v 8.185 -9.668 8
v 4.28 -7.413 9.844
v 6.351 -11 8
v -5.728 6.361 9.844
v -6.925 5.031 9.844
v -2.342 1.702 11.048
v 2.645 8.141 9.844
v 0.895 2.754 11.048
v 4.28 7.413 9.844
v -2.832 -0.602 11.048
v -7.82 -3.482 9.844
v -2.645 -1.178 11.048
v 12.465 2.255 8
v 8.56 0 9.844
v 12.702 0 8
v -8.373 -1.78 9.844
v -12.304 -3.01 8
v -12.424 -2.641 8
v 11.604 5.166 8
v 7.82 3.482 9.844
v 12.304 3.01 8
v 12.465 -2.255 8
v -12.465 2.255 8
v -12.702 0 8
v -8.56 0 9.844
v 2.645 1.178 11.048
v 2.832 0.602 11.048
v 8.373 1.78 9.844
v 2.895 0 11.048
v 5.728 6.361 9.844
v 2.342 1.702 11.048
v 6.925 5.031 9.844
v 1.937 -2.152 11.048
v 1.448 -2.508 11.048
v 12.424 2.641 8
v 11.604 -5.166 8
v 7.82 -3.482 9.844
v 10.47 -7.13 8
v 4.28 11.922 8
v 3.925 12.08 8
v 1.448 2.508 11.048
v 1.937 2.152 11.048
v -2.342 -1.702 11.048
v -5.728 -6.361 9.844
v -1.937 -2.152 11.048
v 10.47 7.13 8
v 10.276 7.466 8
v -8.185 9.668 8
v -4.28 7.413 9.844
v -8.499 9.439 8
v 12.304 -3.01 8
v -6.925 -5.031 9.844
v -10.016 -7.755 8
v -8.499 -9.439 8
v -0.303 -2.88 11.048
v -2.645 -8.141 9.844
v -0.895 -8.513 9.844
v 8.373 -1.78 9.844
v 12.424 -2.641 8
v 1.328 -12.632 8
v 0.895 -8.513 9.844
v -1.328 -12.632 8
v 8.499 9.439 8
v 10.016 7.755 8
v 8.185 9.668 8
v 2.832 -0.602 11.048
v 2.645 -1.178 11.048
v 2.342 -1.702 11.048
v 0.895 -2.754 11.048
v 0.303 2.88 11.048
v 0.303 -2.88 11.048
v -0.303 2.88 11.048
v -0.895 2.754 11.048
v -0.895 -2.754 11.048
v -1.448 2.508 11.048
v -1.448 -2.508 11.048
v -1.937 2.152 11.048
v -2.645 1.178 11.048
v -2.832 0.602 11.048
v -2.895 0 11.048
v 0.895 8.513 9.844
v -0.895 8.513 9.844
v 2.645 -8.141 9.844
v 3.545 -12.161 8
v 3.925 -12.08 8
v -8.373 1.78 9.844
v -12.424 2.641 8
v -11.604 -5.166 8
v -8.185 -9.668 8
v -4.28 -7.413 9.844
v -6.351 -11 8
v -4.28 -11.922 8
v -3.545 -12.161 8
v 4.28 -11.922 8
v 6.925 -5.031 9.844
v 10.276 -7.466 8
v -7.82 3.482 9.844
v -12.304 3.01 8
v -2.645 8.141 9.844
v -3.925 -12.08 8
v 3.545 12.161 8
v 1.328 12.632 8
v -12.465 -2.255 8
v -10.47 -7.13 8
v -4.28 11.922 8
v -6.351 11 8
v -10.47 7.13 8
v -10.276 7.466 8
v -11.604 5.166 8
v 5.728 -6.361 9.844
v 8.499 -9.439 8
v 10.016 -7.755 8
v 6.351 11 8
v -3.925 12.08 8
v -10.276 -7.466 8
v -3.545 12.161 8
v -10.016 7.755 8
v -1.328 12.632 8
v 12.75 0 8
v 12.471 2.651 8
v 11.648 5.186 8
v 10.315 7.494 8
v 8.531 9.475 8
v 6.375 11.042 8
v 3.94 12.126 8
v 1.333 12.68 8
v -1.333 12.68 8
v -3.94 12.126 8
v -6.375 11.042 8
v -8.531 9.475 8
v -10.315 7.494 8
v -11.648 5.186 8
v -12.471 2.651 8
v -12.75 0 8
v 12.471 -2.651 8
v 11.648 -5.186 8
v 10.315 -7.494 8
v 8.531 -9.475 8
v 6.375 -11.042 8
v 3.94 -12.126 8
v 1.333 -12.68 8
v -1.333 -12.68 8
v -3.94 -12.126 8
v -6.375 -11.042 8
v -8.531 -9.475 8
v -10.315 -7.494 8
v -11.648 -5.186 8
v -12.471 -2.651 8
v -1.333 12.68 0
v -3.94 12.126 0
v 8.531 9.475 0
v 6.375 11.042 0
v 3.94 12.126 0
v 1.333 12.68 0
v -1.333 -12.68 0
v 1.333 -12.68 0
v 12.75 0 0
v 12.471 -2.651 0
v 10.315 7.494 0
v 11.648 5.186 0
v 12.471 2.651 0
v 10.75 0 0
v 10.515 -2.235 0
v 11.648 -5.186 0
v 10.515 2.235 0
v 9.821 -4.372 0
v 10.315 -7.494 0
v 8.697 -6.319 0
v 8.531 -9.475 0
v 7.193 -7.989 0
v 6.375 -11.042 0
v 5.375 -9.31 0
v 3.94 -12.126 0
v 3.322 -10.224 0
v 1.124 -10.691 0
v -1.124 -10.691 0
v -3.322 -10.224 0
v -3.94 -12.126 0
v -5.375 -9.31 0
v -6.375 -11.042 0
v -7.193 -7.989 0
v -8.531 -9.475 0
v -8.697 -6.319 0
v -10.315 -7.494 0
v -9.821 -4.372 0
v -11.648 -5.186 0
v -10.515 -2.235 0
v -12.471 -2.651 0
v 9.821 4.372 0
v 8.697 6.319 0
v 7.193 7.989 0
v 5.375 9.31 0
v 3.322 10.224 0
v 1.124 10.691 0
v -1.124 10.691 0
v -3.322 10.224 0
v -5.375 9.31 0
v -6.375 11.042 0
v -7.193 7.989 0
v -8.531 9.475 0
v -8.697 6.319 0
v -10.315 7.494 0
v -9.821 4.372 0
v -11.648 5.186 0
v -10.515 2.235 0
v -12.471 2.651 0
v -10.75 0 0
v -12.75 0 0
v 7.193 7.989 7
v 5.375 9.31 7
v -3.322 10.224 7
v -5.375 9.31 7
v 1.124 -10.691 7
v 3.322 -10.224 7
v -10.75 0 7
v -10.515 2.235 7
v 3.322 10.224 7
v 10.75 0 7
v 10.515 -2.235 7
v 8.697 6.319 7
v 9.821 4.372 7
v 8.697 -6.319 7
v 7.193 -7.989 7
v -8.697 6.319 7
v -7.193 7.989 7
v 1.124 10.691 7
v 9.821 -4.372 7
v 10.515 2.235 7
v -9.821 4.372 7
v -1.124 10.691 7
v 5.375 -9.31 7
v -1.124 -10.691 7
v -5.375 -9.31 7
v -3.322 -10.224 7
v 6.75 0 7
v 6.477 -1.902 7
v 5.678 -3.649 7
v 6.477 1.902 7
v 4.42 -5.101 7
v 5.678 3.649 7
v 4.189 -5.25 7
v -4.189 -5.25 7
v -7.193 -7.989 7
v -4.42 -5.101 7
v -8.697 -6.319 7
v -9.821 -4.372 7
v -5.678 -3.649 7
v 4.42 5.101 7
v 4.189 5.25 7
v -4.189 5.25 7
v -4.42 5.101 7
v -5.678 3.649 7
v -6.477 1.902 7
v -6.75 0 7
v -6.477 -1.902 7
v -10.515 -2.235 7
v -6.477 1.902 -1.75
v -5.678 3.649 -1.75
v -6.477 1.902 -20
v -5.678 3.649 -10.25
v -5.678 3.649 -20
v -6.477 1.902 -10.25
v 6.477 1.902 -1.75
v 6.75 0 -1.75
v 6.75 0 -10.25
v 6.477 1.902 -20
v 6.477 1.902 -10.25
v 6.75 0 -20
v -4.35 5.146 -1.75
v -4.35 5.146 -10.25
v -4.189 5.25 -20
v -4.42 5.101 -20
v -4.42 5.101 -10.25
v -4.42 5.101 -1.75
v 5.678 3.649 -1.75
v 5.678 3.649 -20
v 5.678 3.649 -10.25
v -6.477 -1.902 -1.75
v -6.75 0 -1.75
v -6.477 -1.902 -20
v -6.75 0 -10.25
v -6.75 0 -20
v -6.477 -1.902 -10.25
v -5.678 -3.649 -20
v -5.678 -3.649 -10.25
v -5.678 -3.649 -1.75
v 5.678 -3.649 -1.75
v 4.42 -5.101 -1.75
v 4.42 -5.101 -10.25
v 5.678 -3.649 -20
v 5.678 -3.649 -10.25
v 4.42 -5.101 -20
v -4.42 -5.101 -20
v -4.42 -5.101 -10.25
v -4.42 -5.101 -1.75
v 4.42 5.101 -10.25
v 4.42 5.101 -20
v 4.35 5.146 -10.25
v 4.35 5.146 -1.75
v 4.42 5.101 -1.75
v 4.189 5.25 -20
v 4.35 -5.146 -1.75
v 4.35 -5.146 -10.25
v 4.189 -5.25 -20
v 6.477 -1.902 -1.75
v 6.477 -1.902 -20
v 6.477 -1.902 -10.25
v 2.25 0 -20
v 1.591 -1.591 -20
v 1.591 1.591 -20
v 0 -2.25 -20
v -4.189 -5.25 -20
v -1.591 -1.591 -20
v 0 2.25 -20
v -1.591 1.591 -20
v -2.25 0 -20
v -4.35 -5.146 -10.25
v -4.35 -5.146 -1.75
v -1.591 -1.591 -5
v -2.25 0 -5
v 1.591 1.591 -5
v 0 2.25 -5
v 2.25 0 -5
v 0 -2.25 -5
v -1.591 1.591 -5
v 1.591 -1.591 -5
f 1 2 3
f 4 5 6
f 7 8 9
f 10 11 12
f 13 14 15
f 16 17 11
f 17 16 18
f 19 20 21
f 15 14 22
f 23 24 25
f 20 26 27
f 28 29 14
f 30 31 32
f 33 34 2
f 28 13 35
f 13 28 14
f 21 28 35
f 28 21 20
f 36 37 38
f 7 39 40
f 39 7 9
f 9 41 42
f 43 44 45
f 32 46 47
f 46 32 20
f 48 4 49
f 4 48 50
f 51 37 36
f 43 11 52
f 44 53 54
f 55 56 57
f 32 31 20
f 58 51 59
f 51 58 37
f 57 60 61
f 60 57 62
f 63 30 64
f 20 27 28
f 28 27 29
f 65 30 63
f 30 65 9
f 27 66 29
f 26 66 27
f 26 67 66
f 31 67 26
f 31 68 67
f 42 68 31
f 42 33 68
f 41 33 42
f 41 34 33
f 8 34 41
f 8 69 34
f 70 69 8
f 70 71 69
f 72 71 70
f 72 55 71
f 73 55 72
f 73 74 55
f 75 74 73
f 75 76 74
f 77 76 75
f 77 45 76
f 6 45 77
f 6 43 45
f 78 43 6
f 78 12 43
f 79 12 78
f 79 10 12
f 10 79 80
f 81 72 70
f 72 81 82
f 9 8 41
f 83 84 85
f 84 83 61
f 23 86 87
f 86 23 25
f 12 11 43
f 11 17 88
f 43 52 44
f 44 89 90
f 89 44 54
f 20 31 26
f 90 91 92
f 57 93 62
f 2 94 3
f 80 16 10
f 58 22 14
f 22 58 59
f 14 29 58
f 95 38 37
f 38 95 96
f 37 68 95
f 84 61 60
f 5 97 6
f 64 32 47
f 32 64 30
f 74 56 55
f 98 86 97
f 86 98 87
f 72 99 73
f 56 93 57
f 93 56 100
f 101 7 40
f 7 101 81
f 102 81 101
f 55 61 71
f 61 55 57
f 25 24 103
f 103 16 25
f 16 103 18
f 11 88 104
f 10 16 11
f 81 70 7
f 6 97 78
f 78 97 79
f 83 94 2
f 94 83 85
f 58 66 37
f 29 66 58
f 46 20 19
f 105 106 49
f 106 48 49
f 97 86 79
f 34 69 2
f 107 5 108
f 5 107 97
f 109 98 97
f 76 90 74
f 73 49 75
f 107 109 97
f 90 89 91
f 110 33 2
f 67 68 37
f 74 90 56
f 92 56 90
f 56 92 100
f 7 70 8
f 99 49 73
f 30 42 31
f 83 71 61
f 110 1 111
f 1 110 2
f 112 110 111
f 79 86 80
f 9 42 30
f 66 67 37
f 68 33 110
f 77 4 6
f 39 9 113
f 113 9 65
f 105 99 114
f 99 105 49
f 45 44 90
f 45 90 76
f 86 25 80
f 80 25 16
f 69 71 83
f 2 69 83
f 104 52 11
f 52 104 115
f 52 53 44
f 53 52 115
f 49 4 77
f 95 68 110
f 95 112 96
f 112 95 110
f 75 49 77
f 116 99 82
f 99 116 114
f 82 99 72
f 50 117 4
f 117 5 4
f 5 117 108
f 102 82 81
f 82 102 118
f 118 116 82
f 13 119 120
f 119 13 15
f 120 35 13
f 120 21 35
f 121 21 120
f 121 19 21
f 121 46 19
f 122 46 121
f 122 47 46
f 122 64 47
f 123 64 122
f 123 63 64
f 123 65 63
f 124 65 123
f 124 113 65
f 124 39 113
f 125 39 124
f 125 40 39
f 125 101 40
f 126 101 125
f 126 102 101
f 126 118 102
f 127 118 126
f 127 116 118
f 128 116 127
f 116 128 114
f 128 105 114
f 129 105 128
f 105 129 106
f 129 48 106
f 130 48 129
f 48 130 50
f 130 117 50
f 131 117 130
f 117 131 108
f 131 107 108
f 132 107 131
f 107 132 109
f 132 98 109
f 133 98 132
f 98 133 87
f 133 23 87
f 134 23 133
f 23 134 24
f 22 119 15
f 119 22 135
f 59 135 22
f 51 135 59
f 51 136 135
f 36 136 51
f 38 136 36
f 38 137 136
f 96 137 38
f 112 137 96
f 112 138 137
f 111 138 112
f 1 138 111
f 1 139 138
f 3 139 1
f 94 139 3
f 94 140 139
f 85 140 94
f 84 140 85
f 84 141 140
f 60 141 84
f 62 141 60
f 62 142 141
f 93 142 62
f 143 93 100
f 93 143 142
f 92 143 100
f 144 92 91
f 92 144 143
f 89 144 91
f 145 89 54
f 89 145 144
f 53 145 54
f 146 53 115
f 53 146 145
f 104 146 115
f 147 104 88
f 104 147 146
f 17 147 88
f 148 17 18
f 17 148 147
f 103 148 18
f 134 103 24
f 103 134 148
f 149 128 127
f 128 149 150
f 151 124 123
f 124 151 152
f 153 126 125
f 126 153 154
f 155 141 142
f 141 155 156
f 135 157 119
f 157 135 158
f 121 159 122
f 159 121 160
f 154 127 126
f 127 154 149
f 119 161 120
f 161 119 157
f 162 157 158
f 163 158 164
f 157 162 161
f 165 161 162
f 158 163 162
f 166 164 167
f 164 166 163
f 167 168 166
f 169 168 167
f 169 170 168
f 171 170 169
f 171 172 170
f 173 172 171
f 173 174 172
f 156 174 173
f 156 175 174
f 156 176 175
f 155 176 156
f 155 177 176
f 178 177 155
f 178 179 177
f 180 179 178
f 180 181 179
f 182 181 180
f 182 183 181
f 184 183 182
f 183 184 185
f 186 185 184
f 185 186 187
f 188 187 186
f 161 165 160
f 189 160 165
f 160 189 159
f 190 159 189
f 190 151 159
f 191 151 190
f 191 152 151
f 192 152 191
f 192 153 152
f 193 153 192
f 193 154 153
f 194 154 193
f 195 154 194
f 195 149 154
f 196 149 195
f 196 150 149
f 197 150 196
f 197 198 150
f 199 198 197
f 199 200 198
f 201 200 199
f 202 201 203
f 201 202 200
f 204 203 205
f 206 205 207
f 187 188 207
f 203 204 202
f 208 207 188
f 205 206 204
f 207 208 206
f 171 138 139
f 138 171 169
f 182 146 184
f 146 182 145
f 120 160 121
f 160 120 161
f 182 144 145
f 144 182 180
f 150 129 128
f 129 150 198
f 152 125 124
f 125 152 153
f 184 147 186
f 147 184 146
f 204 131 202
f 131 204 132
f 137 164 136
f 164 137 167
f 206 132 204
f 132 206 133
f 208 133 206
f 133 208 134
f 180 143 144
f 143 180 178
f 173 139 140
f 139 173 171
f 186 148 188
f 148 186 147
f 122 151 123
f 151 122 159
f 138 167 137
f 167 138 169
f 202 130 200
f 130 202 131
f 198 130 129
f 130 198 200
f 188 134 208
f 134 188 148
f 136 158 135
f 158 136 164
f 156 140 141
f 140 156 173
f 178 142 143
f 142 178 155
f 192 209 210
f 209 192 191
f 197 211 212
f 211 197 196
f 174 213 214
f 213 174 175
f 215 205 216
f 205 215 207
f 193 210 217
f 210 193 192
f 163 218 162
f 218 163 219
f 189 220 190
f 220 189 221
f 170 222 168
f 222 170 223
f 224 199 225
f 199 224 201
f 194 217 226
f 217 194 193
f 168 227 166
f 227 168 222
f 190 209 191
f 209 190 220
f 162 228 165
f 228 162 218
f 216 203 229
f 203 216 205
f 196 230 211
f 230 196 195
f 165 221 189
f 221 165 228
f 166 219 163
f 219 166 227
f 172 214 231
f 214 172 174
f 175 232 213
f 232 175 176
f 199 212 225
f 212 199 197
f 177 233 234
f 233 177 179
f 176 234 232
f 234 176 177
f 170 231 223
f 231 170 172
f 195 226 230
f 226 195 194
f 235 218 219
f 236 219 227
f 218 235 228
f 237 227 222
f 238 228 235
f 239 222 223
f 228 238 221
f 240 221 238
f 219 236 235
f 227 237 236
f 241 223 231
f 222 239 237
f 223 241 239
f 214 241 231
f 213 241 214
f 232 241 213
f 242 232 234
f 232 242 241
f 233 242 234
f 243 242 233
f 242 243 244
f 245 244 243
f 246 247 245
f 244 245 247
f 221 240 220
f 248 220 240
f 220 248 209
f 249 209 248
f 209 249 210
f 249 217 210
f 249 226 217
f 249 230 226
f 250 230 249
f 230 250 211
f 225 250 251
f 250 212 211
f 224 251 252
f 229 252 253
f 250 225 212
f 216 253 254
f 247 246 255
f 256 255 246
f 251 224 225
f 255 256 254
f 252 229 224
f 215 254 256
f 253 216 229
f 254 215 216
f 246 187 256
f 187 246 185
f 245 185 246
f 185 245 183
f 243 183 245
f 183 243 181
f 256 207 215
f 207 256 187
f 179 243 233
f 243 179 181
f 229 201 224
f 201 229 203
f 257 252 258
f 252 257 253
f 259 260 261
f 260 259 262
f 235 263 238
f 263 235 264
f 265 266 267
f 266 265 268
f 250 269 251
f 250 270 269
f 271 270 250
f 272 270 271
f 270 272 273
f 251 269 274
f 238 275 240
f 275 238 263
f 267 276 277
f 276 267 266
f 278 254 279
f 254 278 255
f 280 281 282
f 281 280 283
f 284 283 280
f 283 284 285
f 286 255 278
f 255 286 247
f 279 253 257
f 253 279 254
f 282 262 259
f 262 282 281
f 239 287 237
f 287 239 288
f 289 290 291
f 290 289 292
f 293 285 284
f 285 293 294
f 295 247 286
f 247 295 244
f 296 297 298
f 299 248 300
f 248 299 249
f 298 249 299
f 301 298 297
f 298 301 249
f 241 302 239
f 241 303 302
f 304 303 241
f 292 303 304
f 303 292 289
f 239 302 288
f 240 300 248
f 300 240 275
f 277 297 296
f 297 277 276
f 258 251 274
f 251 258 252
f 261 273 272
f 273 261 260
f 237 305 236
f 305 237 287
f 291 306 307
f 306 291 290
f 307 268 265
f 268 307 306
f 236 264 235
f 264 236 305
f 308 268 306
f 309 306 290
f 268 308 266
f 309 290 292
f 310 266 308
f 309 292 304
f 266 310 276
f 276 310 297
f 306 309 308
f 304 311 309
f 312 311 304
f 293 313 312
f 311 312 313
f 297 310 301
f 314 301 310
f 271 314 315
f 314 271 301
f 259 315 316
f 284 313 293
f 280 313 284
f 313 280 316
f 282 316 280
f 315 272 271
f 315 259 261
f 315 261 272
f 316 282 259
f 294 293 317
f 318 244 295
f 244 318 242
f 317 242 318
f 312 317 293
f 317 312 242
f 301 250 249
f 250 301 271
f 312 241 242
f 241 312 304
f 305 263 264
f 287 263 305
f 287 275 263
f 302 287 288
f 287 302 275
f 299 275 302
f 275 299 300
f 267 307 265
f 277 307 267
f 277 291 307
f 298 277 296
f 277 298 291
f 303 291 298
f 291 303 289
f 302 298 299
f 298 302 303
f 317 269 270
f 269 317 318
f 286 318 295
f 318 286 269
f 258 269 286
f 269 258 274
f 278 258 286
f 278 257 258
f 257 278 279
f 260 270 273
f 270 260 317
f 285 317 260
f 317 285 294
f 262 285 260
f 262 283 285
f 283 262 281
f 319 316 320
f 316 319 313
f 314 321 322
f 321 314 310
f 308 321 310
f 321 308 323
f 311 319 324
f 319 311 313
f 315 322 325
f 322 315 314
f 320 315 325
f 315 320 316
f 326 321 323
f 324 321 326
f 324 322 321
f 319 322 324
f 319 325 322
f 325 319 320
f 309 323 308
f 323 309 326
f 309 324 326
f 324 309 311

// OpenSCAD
union() {
// Cap
union() {
    // Top of the cap
    translate (v = [0, 0, -16.5]) {
        difference() {
            sphere(d = 55.4);
            translate(v = [0, 0, -3]) {
                cube(size = [60, 60, 55], center = true);
            }
        }
    }
    // Bottom of the cap
    difference() {
        cylinder(h = 8, d = 25.5);
        // Cutting cylinder, cutting off 7 mm
        translate (v = [0, 0, -1]) {
            cylinder(h = 8, d = 21.5);
        }
    }
}




// Shaft
translate (v=[0, 0, -20]) {
   difference() {
        // Main shaft 
        intersection() {
            cylinder(h = 30, d = 13.5);
            cube(size = [14, 10.5, 100], center = true);
        }
        translate (v = [8.6, 0, 14]) {
            cube(size = [8.5, 11, 8.5], center = true);
        }
         translate (v = [-8.6, 0, 14]) {
            cube(size = [8.5, 11, 8.5], center = true);
        }
        
        // Screw hole
        translate (v = [0, 0, -1]) {
            cylinder(h = 16, d = 4.5);
        }
    }
}
}
